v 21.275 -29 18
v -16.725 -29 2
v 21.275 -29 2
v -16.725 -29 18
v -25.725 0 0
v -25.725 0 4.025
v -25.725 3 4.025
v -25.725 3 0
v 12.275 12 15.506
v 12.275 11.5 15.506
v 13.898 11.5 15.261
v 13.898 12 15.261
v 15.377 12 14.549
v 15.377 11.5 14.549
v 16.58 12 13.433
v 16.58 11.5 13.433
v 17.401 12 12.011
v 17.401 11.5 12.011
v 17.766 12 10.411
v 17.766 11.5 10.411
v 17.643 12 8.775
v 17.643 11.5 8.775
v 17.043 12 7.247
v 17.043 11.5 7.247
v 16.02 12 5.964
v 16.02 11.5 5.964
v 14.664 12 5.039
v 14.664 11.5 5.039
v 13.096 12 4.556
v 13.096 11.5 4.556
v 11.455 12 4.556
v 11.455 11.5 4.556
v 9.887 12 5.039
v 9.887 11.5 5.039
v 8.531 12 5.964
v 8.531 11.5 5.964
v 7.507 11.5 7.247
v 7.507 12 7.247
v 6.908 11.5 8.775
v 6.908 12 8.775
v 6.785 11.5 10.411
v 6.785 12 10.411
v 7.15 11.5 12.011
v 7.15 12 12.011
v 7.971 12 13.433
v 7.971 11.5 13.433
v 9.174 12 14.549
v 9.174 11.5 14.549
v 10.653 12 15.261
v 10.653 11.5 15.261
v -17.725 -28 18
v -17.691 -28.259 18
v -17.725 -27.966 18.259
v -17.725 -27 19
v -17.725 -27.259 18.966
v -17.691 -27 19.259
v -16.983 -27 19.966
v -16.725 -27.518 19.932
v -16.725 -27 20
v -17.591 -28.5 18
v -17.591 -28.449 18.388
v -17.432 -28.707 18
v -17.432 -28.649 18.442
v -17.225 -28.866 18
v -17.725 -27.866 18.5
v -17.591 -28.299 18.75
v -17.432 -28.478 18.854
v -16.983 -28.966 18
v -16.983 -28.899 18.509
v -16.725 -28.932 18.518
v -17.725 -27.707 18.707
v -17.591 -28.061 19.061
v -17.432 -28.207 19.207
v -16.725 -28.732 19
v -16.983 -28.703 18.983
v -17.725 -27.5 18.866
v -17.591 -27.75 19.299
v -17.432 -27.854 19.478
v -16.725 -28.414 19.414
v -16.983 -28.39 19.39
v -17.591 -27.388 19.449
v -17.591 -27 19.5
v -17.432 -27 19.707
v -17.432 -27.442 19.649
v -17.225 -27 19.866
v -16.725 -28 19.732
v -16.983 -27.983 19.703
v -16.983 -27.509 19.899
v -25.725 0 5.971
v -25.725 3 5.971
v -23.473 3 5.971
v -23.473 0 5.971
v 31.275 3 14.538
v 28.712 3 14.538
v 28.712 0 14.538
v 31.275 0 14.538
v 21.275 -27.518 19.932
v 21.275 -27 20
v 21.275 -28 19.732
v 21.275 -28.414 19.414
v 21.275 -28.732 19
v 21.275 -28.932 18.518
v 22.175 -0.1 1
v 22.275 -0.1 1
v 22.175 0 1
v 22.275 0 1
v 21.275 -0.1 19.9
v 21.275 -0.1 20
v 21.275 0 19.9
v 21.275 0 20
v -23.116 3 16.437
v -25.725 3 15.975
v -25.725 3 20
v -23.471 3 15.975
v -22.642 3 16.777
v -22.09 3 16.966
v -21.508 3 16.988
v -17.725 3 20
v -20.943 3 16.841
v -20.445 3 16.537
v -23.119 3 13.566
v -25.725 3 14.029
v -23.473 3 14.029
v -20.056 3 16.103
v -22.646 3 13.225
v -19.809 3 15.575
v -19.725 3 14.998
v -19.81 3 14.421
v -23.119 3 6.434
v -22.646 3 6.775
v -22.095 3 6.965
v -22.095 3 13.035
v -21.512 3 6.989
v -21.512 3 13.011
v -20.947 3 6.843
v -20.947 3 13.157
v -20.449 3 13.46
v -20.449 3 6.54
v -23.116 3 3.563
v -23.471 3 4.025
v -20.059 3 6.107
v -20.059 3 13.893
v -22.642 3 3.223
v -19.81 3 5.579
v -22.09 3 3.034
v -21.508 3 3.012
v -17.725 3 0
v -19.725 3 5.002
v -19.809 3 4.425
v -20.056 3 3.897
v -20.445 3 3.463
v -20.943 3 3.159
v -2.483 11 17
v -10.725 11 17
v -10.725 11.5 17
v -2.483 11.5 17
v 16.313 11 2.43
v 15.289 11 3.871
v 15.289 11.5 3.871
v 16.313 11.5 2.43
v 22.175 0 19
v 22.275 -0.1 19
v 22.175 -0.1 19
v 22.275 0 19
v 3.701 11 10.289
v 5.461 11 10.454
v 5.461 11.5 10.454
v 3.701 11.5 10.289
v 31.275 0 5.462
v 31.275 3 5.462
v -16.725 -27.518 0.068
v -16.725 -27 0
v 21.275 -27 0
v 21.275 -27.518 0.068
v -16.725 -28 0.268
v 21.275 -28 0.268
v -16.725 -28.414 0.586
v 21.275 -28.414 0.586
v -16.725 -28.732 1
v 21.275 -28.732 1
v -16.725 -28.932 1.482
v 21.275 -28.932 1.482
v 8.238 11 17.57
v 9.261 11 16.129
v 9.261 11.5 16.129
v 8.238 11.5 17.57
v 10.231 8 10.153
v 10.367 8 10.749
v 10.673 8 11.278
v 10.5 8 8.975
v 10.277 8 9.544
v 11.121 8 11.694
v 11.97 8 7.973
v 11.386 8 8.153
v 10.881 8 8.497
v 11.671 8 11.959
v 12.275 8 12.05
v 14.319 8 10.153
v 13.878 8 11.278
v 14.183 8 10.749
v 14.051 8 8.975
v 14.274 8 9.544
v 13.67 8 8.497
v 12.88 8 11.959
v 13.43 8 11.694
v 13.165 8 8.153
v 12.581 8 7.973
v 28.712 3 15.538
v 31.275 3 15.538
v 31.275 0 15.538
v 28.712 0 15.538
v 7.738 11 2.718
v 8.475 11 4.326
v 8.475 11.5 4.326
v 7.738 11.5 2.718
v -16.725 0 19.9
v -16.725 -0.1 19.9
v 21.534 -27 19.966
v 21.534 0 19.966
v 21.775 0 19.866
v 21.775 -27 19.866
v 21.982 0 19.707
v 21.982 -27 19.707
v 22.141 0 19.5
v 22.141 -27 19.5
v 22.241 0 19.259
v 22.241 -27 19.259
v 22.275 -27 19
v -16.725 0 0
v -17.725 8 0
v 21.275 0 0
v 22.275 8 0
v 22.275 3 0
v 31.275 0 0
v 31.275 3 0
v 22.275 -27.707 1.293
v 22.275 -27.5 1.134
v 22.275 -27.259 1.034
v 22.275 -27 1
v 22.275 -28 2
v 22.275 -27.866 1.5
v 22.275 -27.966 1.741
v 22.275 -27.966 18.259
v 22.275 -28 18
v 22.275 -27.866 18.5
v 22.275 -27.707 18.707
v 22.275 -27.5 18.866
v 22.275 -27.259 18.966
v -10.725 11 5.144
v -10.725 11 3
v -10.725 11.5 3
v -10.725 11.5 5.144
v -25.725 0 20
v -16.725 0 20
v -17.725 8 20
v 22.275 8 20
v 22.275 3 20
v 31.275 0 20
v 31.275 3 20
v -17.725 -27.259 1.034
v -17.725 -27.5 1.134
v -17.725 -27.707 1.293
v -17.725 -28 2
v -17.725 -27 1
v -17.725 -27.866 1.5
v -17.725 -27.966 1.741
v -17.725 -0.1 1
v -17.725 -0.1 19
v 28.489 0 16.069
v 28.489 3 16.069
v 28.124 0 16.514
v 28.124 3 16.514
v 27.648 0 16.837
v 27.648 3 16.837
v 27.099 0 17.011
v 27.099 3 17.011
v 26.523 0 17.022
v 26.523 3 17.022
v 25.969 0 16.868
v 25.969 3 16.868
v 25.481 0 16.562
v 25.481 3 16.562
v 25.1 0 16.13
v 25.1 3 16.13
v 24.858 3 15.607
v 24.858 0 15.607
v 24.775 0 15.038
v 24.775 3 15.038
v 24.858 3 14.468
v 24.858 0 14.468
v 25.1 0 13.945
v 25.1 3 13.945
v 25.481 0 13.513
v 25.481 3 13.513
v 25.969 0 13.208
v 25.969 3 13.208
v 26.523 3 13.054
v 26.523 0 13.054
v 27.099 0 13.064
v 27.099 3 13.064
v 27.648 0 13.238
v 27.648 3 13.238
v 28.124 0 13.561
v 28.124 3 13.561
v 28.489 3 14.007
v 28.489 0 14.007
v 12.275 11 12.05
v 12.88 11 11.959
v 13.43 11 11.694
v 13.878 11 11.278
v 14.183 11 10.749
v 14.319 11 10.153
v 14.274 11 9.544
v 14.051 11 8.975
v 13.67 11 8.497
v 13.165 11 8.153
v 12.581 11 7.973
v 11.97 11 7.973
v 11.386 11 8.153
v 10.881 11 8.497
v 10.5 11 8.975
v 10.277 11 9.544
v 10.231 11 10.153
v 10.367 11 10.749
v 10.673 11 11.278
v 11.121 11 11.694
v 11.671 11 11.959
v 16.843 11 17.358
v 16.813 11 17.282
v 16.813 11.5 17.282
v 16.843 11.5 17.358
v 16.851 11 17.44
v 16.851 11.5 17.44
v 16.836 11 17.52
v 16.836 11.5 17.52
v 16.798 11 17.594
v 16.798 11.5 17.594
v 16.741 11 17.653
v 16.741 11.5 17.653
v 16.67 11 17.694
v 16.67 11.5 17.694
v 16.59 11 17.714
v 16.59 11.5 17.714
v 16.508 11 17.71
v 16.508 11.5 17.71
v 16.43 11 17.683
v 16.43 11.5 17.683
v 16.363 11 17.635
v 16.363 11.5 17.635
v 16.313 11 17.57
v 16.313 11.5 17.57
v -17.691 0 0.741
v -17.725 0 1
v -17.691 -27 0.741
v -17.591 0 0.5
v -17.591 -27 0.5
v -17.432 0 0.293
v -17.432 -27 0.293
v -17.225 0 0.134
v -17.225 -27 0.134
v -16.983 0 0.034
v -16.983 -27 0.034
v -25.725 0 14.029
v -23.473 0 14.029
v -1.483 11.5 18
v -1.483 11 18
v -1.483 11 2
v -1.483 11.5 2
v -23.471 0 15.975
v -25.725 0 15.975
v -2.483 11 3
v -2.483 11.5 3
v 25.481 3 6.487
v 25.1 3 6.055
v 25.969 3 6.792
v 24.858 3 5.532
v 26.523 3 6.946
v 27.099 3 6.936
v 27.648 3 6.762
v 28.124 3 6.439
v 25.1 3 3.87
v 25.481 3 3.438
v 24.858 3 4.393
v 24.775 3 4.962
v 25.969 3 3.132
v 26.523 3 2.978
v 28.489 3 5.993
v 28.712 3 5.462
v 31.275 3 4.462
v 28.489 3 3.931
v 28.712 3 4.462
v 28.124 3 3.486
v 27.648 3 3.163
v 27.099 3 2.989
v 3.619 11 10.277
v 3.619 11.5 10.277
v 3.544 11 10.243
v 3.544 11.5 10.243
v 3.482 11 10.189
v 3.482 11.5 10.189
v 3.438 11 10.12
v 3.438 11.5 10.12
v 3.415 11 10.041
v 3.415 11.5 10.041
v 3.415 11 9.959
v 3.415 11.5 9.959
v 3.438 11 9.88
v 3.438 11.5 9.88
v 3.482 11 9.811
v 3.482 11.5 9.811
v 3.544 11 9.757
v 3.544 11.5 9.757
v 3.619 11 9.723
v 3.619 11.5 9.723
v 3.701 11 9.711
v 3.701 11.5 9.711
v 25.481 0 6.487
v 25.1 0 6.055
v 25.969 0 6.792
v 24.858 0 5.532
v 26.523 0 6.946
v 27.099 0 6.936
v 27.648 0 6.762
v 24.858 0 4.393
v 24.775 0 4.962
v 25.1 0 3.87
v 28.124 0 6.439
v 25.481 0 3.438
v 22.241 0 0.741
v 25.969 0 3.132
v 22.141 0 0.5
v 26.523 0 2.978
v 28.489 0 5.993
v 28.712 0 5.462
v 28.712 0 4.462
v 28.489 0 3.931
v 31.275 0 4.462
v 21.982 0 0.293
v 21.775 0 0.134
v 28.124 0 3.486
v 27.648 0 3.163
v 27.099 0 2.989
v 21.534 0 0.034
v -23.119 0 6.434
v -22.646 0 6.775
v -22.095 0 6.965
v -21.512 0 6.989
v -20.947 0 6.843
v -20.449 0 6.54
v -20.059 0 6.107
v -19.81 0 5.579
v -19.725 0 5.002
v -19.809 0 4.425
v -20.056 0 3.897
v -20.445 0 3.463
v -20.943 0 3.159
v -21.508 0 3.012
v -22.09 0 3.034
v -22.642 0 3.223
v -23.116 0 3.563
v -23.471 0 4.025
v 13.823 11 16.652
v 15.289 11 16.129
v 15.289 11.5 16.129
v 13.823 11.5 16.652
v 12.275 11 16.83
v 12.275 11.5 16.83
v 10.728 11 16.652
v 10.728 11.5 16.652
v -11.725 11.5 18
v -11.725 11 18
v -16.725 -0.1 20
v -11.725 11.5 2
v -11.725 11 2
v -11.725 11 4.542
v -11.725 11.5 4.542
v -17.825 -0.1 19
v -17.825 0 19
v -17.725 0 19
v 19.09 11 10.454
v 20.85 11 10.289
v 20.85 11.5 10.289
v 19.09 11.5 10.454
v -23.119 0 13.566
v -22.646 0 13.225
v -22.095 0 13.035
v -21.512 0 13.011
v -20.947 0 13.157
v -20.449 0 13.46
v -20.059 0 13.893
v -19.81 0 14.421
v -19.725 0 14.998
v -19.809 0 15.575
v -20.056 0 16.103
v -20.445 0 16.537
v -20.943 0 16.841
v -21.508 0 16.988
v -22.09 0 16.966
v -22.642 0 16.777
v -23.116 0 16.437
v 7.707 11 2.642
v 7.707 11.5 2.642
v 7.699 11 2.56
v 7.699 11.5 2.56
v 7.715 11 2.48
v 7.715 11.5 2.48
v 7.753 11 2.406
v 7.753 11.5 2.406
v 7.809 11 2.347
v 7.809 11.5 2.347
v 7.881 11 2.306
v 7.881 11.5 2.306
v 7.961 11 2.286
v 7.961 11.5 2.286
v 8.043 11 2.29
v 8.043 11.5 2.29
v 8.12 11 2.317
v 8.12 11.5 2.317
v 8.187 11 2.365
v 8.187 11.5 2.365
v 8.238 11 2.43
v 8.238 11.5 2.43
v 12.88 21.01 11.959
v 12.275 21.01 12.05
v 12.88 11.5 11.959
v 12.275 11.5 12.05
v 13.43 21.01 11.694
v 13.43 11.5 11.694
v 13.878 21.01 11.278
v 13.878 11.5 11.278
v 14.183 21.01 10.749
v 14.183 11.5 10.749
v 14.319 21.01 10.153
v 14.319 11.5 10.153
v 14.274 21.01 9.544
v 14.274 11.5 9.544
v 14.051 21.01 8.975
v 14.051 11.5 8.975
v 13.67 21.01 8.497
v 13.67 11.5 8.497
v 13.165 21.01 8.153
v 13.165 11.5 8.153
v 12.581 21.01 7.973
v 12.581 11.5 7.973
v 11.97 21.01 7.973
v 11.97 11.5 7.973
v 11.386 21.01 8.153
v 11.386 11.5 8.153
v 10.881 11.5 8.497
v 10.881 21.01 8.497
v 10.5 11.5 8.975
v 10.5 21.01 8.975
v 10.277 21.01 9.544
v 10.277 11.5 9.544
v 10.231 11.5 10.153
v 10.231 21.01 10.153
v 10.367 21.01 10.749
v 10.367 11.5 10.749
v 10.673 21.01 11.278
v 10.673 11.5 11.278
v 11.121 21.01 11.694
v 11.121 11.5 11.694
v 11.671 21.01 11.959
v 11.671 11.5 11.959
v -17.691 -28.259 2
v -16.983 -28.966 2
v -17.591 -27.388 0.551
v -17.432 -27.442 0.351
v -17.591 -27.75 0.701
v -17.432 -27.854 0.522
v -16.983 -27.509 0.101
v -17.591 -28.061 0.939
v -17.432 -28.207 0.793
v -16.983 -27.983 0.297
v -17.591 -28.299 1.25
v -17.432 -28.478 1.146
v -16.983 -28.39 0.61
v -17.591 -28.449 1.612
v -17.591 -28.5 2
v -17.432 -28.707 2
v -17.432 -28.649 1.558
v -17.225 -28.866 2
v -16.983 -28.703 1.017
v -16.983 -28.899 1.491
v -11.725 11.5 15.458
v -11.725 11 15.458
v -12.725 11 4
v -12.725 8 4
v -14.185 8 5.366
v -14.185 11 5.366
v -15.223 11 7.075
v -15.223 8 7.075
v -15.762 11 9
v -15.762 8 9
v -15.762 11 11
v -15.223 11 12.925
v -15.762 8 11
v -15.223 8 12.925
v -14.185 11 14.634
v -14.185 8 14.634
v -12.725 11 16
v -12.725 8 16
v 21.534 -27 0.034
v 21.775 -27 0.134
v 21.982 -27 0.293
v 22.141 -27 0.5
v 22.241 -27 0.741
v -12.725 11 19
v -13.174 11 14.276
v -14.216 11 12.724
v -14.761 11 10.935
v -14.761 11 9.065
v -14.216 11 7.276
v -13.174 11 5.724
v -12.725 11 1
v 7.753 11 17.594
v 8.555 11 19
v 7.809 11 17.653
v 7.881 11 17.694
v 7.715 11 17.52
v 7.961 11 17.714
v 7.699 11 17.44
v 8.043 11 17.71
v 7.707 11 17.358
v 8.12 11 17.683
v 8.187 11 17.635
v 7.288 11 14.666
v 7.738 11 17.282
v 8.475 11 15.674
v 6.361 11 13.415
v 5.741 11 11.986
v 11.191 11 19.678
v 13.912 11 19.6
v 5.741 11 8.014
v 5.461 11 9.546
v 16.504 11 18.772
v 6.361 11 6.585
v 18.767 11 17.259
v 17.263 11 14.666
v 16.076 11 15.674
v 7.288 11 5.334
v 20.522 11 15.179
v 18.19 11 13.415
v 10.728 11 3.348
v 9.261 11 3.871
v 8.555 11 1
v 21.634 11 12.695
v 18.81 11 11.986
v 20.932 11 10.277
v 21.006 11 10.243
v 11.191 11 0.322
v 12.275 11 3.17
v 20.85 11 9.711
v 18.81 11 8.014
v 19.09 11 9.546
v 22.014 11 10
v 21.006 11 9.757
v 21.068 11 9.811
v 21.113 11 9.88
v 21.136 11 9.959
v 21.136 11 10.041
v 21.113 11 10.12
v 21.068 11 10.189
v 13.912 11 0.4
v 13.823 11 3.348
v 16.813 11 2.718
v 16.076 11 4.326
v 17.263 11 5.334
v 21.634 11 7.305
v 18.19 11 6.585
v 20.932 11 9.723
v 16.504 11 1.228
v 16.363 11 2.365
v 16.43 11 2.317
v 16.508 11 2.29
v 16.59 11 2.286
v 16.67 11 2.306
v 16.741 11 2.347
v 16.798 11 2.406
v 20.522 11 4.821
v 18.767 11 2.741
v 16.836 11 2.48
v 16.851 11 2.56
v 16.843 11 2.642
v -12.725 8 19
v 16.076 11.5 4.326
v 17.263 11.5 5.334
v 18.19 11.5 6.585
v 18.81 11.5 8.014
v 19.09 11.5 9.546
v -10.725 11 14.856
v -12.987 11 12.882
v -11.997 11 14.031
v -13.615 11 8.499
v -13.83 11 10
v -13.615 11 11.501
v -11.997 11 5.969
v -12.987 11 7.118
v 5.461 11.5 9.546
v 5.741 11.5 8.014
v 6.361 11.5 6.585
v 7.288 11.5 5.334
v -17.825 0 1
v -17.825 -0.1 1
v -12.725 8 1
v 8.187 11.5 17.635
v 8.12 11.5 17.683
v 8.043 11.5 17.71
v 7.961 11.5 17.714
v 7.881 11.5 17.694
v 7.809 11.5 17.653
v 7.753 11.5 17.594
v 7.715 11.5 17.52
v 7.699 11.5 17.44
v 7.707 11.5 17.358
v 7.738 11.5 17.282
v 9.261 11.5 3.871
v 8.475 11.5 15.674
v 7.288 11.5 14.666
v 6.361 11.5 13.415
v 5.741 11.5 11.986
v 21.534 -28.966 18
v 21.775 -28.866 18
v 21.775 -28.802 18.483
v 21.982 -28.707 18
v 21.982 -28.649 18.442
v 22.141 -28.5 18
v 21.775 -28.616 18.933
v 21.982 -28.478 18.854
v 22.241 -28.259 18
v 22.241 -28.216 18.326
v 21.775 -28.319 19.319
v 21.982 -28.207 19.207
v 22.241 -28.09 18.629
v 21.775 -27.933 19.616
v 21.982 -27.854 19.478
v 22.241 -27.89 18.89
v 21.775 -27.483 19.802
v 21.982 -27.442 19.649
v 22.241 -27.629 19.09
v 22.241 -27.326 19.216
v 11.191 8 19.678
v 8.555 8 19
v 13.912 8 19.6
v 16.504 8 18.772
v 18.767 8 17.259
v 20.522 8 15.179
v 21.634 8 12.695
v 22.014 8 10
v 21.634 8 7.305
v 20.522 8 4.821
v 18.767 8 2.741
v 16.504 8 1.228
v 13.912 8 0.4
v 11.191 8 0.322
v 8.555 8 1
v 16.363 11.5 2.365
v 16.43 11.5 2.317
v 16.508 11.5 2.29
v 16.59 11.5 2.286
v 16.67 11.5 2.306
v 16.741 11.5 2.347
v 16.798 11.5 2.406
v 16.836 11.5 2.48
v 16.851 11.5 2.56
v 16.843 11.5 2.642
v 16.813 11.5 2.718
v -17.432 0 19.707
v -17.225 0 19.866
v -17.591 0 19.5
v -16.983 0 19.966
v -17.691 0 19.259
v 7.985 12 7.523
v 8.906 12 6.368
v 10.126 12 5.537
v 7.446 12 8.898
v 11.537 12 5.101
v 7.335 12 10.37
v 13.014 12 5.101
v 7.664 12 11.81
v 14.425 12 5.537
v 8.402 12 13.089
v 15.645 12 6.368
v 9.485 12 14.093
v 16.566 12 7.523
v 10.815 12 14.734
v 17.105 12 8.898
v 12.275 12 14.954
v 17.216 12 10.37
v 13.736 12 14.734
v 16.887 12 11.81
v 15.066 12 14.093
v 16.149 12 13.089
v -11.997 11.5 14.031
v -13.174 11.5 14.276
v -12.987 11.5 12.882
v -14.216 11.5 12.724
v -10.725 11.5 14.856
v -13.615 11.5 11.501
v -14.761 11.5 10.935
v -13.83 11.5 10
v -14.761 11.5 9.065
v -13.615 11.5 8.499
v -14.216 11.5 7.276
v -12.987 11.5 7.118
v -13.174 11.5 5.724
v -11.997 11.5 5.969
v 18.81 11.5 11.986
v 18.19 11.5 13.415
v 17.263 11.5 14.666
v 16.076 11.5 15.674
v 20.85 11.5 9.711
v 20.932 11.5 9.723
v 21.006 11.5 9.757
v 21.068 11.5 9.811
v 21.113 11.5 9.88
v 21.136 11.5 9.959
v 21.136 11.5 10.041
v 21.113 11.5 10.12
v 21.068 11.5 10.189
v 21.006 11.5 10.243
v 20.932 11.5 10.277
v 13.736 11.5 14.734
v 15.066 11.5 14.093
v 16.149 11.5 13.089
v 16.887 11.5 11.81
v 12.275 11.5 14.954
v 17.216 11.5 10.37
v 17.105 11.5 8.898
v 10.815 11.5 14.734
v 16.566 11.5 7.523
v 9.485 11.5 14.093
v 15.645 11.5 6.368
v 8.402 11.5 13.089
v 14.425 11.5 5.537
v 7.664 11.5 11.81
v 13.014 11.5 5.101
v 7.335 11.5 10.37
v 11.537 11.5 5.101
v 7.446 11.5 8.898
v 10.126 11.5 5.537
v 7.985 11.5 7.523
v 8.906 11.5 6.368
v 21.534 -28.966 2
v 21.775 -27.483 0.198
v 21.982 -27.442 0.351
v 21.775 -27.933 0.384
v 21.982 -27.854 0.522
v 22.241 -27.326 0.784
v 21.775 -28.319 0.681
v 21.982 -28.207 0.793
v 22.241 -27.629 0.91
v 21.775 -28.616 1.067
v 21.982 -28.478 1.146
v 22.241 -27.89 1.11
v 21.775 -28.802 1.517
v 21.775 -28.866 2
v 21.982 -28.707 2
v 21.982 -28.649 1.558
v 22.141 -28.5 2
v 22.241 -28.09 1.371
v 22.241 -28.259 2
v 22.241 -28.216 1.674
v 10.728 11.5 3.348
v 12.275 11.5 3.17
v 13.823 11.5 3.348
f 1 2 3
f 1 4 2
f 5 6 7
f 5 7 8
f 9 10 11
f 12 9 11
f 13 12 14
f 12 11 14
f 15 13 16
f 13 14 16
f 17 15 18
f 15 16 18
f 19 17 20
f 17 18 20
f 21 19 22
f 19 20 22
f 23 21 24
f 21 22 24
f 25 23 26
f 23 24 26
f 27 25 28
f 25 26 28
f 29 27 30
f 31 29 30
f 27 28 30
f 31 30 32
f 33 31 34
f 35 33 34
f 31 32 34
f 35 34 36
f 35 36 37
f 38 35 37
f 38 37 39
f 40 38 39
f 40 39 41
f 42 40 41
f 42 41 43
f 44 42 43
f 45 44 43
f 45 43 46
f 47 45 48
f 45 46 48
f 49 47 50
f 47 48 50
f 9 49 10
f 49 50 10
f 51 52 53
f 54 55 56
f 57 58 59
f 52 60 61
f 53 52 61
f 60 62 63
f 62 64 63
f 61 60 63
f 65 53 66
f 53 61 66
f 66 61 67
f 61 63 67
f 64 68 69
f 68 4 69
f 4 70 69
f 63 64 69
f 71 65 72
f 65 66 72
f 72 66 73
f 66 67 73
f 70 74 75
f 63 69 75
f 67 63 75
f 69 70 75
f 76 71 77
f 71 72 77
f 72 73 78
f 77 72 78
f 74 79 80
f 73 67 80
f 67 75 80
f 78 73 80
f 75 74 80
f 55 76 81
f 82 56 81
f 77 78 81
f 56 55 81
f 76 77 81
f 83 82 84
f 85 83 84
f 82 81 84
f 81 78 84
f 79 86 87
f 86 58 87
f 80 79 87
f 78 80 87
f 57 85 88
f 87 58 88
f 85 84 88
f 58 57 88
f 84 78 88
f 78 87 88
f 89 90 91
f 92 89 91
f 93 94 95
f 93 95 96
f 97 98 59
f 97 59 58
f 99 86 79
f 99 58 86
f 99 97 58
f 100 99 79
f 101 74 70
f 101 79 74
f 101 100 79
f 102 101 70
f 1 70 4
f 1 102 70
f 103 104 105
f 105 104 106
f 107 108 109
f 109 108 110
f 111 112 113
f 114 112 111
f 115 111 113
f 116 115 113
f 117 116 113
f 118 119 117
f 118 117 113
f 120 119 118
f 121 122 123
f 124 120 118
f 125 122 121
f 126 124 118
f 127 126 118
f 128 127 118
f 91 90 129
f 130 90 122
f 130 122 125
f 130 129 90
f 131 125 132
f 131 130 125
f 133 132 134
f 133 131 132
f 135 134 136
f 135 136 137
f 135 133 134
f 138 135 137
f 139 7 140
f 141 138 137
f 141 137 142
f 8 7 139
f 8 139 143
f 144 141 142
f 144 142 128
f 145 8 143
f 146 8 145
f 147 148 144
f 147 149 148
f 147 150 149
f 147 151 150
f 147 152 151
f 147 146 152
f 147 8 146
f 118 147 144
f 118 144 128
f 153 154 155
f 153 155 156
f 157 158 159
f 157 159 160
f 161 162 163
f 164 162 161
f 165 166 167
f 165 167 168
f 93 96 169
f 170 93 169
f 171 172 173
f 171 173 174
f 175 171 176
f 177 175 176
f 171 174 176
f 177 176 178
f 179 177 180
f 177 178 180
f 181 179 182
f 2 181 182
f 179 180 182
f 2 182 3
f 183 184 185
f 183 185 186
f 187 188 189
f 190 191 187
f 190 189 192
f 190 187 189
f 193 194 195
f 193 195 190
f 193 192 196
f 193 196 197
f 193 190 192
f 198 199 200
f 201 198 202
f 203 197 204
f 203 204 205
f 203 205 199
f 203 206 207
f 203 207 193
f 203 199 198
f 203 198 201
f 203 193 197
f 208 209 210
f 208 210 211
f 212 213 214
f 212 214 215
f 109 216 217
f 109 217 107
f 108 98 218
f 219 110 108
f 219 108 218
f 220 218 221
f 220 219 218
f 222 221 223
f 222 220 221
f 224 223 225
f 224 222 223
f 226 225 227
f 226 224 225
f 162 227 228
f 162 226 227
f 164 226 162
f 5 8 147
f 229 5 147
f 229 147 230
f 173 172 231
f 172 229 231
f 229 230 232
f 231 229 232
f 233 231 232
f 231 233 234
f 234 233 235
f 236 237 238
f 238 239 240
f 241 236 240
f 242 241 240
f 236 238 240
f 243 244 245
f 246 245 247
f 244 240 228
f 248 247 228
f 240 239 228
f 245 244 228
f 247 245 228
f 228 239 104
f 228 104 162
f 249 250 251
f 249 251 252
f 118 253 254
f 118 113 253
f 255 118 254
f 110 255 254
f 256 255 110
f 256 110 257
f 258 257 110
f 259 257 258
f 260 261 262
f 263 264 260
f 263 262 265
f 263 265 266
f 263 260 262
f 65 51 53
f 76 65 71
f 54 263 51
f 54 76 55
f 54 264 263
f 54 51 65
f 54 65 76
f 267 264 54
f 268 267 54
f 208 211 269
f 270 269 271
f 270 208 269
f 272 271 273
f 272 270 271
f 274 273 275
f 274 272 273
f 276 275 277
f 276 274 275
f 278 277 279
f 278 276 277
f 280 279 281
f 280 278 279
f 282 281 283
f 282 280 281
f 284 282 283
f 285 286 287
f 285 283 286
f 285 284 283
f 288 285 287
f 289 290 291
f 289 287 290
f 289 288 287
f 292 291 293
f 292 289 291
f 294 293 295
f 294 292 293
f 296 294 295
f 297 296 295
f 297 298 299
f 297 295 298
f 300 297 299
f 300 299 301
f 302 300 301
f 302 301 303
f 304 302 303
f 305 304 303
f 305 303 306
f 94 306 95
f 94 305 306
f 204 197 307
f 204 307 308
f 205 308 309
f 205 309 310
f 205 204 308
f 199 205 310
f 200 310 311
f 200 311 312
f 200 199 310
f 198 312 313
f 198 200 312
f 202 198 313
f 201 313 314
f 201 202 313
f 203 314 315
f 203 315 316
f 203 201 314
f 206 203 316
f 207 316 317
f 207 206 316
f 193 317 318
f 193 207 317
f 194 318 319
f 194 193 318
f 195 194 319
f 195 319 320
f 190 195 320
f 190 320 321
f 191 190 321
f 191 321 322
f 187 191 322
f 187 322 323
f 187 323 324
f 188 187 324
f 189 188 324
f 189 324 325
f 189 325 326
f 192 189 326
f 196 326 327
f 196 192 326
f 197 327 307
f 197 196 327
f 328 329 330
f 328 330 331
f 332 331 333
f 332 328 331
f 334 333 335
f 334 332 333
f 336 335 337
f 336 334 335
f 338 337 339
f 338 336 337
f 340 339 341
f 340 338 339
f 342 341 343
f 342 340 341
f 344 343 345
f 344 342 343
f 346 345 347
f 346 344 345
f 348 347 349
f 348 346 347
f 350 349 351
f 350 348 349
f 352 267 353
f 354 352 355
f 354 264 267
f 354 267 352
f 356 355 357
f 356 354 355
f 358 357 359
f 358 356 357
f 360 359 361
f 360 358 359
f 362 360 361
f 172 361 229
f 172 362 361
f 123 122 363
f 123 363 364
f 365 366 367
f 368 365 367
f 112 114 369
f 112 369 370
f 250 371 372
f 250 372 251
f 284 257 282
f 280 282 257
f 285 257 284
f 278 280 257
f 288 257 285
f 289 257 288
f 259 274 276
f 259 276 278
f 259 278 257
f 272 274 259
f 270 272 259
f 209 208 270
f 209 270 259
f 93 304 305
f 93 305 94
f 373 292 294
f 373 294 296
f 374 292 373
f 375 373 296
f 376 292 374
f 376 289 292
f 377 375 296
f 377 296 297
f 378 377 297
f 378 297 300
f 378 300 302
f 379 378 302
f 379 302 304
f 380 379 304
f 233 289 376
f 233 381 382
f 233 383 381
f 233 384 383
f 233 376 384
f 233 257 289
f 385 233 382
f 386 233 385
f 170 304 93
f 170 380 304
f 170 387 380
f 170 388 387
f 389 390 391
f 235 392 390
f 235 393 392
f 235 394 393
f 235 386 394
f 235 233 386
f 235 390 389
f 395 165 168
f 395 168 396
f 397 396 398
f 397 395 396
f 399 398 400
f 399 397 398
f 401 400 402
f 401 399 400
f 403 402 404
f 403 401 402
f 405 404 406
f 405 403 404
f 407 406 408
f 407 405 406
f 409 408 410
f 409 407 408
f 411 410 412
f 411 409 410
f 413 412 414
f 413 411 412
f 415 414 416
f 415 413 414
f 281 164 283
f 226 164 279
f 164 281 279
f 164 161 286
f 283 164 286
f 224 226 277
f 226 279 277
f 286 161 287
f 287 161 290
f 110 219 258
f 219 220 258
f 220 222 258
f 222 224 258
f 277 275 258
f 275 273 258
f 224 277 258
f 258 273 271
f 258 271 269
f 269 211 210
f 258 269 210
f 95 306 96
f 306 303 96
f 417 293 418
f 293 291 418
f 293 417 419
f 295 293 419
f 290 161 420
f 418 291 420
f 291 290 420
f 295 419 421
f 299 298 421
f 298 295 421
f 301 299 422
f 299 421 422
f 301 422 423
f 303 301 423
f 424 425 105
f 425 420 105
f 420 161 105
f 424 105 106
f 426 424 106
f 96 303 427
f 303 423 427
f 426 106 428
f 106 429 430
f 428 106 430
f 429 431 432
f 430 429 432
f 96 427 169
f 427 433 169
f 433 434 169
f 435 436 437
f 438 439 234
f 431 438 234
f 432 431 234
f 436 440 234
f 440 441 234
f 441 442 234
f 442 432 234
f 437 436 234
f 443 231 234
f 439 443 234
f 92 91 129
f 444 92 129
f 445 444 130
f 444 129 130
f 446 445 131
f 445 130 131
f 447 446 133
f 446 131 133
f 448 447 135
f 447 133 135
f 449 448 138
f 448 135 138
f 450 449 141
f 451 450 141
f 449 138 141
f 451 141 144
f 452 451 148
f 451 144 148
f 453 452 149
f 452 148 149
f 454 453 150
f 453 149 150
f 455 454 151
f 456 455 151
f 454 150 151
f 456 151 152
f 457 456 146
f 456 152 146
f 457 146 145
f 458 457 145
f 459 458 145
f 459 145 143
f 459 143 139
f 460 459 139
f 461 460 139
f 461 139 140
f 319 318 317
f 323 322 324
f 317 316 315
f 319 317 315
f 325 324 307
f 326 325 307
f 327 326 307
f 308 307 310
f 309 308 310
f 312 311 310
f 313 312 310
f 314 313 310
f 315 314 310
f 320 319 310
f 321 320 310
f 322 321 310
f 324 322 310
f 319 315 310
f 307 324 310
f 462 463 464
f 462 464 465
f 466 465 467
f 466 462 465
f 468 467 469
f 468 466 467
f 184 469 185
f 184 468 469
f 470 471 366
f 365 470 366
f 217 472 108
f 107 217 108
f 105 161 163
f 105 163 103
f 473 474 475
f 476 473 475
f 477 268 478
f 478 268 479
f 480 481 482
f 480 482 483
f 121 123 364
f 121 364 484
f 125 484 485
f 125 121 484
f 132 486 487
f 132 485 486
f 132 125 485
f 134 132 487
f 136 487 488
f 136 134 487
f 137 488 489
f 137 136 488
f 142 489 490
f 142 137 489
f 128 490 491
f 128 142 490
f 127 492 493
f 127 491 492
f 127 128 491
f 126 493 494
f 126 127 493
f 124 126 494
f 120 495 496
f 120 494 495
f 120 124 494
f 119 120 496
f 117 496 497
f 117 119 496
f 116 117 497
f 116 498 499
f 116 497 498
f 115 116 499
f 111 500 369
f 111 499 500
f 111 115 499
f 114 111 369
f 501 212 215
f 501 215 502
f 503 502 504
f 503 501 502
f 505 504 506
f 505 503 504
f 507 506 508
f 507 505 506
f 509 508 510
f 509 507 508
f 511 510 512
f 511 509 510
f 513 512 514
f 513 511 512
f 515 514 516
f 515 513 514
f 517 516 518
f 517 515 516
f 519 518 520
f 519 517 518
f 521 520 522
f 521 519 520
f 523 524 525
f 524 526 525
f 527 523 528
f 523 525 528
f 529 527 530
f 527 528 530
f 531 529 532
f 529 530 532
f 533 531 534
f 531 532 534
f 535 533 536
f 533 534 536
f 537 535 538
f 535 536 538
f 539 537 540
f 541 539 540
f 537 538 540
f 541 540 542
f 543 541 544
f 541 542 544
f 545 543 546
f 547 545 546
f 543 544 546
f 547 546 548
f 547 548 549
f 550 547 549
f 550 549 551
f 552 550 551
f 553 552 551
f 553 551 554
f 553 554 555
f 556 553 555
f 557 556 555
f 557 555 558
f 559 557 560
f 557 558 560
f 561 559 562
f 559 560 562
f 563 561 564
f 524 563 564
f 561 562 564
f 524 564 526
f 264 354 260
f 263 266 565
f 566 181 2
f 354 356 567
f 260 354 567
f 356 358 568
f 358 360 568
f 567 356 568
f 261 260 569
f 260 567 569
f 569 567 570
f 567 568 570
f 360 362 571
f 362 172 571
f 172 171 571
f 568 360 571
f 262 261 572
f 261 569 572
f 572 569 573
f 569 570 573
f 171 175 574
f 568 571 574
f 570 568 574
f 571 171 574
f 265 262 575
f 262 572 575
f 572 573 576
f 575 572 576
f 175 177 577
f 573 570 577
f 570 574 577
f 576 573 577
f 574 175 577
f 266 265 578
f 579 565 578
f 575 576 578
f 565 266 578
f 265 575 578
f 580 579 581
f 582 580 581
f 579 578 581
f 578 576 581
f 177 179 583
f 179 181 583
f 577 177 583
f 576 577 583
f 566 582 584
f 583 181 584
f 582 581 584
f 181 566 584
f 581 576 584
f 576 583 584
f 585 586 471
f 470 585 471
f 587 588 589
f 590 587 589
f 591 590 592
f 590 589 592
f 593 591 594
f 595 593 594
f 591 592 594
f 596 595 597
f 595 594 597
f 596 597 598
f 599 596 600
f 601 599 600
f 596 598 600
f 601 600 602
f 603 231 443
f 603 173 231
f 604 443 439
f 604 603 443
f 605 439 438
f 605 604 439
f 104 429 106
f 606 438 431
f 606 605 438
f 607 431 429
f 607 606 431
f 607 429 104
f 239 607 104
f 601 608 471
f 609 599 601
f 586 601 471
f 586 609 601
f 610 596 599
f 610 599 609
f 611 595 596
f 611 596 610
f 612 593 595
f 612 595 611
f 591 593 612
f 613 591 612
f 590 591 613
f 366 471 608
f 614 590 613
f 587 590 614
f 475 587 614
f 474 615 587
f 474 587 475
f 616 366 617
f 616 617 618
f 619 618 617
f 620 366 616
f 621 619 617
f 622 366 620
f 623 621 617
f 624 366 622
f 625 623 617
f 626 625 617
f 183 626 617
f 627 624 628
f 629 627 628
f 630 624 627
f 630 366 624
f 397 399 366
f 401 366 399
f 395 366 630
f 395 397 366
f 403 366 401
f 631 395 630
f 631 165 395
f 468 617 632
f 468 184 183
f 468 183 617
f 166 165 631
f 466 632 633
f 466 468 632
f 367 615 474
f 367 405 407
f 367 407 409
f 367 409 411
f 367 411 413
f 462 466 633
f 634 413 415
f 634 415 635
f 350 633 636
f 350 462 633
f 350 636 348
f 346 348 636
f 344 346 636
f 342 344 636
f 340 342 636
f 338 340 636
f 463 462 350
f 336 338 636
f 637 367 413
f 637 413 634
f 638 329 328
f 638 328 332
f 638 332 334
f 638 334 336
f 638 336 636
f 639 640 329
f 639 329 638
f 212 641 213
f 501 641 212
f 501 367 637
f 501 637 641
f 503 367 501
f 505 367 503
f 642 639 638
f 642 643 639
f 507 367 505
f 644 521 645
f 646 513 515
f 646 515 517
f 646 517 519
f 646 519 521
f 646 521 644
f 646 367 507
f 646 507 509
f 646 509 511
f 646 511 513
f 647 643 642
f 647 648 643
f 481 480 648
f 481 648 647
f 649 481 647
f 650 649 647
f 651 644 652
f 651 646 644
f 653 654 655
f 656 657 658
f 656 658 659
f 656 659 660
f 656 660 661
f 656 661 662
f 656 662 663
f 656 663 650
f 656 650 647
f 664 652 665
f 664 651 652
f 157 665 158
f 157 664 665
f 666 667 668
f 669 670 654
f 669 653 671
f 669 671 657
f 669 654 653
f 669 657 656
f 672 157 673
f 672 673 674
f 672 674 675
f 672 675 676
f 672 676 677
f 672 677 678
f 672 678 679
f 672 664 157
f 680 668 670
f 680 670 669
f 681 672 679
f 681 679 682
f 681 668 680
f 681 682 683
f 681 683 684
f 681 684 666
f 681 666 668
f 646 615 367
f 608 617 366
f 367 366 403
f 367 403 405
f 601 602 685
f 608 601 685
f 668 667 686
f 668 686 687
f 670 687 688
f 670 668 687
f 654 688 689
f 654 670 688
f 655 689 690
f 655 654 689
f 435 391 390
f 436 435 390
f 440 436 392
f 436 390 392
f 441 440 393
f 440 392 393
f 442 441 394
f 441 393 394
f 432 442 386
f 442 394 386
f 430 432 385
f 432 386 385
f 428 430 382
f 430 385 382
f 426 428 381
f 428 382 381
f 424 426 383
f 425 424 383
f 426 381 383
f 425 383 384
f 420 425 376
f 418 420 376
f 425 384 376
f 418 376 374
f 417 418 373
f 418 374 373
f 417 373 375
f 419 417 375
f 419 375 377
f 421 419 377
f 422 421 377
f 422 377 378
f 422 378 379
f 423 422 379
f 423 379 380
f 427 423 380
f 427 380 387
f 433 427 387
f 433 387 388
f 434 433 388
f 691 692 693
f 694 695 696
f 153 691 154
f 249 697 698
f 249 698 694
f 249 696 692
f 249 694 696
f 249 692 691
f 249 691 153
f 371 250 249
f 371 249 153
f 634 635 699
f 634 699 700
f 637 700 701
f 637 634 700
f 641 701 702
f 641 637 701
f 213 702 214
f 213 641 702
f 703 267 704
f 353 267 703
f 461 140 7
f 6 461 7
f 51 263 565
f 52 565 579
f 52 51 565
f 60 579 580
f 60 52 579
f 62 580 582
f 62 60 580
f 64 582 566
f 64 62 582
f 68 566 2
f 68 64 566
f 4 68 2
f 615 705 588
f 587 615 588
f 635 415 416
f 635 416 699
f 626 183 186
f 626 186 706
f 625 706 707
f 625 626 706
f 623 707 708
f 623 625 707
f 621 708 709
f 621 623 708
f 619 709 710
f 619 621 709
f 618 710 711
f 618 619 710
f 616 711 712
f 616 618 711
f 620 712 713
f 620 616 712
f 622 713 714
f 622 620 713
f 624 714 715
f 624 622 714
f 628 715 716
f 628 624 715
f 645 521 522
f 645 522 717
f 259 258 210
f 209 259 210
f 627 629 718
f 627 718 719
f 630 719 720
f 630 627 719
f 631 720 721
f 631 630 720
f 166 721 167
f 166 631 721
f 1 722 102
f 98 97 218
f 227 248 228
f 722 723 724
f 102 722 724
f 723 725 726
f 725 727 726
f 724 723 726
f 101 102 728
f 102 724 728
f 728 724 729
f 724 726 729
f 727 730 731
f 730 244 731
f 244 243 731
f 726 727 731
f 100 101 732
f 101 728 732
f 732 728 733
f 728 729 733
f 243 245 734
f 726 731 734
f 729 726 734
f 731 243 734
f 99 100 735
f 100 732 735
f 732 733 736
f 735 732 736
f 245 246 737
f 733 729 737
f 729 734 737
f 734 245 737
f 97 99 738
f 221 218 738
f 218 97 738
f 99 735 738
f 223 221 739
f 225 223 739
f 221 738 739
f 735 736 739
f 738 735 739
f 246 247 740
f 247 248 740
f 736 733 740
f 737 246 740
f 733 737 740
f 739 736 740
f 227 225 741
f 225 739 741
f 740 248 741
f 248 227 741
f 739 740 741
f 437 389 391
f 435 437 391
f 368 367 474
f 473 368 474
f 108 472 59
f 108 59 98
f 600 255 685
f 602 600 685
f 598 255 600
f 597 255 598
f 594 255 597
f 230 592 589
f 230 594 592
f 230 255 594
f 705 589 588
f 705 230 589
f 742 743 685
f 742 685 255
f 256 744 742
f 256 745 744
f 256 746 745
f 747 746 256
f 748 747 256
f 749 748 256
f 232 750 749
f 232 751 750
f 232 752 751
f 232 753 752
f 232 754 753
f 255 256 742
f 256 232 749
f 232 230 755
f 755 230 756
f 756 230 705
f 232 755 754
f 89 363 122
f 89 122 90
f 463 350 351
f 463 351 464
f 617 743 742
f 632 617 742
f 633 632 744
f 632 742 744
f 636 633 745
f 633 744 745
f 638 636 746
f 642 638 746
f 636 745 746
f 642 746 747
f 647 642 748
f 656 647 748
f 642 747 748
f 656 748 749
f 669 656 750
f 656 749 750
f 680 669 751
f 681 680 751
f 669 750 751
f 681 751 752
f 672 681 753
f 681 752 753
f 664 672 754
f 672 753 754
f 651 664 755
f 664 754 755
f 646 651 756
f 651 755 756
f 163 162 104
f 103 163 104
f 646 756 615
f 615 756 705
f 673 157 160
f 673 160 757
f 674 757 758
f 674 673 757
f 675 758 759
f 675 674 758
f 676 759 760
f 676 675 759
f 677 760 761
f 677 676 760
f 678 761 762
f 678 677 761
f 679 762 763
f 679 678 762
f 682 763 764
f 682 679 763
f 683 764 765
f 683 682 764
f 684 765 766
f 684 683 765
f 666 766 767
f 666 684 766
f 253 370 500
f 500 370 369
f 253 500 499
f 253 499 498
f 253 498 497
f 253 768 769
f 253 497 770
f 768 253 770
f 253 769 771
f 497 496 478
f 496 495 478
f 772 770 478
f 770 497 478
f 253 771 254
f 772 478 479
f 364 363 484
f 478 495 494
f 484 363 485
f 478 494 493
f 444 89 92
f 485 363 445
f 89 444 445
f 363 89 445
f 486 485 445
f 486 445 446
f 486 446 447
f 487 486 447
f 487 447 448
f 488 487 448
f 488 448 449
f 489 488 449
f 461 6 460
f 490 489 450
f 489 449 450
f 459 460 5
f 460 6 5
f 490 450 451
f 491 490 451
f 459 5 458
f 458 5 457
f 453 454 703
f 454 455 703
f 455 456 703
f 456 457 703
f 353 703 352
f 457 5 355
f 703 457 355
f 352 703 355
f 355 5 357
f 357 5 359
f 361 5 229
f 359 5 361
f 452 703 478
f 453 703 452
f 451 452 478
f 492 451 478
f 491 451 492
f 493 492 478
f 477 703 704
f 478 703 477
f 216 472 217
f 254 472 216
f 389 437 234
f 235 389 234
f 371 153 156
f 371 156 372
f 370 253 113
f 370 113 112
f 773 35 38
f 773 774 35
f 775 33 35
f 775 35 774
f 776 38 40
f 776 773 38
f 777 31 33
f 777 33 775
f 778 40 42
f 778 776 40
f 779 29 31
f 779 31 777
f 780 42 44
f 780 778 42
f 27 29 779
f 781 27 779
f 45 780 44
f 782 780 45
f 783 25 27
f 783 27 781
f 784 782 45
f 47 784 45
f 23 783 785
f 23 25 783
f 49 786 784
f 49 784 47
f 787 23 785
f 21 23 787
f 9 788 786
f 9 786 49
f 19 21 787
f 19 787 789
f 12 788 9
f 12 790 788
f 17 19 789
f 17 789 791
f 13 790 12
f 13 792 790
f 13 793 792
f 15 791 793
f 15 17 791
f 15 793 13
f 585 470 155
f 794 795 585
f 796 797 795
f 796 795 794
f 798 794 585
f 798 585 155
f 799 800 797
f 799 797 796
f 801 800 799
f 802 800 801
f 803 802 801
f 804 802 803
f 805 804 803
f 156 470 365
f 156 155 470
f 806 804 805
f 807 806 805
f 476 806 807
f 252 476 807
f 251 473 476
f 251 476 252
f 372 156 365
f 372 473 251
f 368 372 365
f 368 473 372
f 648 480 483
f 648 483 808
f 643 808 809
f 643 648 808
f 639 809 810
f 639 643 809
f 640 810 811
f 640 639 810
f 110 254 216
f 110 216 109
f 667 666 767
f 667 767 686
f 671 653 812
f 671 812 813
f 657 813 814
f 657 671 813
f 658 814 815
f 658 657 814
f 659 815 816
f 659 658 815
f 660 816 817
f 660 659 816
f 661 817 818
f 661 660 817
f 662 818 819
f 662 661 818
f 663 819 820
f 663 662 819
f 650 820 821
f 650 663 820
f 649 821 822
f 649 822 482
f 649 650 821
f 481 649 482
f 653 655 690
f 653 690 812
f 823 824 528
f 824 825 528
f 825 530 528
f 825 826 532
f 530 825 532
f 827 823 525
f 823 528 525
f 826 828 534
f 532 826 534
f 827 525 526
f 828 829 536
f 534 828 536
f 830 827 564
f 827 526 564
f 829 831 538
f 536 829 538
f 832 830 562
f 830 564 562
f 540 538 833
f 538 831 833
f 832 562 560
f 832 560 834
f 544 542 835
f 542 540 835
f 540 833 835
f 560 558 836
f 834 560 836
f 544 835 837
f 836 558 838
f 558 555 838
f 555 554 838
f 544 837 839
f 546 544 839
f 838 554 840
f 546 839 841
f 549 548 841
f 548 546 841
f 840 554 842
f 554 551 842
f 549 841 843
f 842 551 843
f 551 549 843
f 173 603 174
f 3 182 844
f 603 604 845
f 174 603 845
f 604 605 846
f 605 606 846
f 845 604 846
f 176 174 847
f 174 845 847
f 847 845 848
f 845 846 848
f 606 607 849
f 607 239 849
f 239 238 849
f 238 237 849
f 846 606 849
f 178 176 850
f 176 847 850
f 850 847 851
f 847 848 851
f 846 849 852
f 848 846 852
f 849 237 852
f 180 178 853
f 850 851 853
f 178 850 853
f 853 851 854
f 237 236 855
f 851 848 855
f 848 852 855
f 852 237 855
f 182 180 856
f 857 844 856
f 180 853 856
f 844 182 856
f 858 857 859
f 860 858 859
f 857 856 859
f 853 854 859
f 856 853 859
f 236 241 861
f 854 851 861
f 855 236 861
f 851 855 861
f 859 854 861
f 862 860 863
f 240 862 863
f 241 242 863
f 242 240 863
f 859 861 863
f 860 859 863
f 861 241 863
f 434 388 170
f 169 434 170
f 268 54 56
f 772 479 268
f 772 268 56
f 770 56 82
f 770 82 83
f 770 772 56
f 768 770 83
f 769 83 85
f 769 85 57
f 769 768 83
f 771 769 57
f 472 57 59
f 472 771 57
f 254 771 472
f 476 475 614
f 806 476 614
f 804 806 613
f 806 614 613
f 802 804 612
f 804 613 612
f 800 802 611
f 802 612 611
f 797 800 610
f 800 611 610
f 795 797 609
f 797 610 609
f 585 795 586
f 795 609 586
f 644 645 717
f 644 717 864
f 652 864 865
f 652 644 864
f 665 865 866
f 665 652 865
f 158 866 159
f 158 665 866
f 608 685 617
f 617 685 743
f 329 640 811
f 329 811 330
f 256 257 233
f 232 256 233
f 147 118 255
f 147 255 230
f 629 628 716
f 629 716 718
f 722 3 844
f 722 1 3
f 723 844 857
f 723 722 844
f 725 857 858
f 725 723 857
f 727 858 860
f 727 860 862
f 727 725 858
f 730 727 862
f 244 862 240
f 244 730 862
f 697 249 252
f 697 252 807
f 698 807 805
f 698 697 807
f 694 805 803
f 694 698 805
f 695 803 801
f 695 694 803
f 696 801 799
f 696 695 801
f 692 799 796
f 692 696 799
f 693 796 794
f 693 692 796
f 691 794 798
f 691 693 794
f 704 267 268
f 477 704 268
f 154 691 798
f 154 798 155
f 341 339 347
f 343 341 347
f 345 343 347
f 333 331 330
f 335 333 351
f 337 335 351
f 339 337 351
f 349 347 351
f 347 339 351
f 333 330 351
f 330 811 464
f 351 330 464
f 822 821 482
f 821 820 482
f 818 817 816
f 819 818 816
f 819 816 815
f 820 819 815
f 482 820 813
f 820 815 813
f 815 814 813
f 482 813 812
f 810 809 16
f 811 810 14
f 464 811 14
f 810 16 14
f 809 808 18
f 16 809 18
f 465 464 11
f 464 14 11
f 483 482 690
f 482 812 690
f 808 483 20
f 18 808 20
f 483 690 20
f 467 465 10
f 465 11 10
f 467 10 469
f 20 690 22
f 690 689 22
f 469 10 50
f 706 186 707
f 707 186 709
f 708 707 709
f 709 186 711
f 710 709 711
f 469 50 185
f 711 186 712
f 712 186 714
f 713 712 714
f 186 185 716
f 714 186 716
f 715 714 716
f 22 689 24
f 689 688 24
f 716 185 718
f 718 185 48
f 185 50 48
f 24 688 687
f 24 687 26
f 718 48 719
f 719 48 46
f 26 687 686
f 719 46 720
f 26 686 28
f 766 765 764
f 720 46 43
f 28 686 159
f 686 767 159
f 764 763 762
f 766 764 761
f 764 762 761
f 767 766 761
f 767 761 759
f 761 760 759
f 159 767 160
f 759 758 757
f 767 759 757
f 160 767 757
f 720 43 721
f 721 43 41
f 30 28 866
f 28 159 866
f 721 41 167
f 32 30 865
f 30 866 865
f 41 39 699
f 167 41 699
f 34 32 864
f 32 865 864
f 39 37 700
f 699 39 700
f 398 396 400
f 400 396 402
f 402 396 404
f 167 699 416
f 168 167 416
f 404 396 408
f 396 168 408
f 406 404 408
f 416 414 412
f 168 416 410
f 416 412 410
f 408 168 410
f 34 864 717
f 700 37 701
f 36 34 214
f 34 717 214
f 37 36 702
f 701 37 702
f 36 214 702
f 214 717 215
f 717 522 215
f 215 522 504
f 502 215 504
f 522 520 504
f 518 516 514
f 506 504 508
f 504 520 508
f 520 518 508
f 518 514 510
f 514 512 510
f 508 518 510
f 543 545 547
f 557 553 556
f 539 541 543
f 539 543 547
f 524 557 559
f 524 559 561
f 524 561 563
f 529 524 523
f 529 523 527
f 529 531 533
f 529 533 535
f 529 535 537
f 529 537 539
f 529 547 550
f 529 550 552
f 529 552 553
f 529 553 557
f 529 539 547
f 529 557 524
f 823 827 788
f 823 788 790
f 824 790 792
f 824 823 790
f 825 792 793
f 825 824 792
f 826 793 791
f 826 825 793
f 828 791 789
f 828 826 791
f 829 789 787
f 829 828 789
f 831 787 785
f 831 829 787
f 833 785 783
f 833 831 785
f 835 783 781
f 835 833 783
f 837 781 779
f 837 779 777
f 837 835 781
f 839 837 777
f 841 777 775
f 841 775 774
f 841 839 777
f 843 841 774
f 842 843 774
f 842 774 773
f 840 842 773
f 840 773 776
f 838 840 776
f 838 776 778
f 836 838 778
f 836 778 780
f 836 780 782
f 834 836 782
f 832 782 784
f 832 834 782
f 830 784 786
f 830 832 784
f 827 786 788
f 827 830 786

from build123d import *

# Parameters (mm, degrees)
SKETCH1_W            = 57
SKETCH1_H            = 20
BOSS_EXTRUDE2_DEPTH  = 3
SKETCH3_W            = 40
SKETCH3_H            = 20
BOSS_EXTRUDE3_DEPTH  = 27
SKETCH4_W            = 40
SKETCH4_H            = 20
BOSS_EXTRUDE4_DEPTH  = 5
SKETCH7_R            = 2.049783944
BOSS_EXTRUDE5_DEPTH  = 3
SKETCH8_W            = 40
SKETCH8_H            = 20
BOSS_EXTRUDE6_DEPTH  = 2
FILLET1_R            = 2
FILLET3_R            = 1
CUT_EXTRUDE1_DEPTH   = 12
CUT_EXTRUDE2_DEPTH   = 12
SKETCH12_R           = 2.049783944
BOSS_EXTRUDE7_DEPTH  = 10
SKETCH13_W           = 38
SKETCH13_H           = 0.1
CUT_EXTRUDE3_DEPTH   = 0.1
SKETCH14_W           = 18
SKETCH14_H           = 0.1
CUT_EXTRUDE4_DEPTH   = 0.1
SKETCH16_W           = 18
SKETCH16_H           = 0.1
BOSS_EXTRUDE10_DEPTH = 0.1
BOSS_EXTRUDE13_DEPTH = 0.5
SKETCH18_R           = 5.505741297
SKETCH18_R_2         = 4.954025226
BOSS_EXTRUDE14_DEPTH = 0.5
BOSS_EXTRUDE15_DEPTH = 0.5
SKETCH22_R           = 2.049783944
BOSS_EXTRUDE17_DEPTH = 0.01


with BuildPart() as part:
    # Sketch1 → Boss-Extrude2 (new body)
    with BuildSketch(Plane(origin=(0, 0, 0), x_dir=(1, 0, 0), z_dir=(0, 1, 0))):
        with Locations((2.775361092, -10)):
            Rectangle(SKETCH1_W, SKETCH1_H)
    extrude(amount=BOSS_EXTRUDE2_DEPTH)

    # Sketch3 → Boss-Extrude3 (add)
    with BuildSketch(Plane.XZ):
        with Locations((2.275361092, 10)):
            Rectangle(SKETCH3_W, SKETCH3_H)
    extrude(amount=BOSS_EXTRUDE3_DEPTH)

    # Sketch4 → Boss-Extrude4 (add)
    with BuildSketch(Plane(origin=(0, 3, 0), x_dir=(1, 0, 0), z_dir=(0, 1, 0))):
        with Locations((2.275361092, -10)):
            Rectangle(SKETCH4_W, SKETCH4_H)
    extrude(amount=BOSS_EXTRUDE4_DEPTH)

    # Sketch7 → Boss-Extrude5 (add)
    with BuildSketch(Plane(origin=(0, 8, 0), x_dir=(1, 0, 0), z_dir=(0, 1, 0))):
        with BuildLine():
            Line((8.555331619, -1), (-12.724638908, -1))
            Line((-12.724638908, -1), (-12.724638908, -4))
            ThreePointArc((-12.724638908, -4), (-15.83010298, -10), (-12.724638908, -16))
            Line((-12.724638908, -16), (-12.724638908, -19))
            Line((-12.724638908, -19), (8.555331619, -19))
            ThreePointArc((8.555331619, -19), (22.013873261, -10), (8.555331619, -1))
        make_face()
        with Locations(Location((12.275361092, -10, 0), (0, 0, 270))):
            Circle(SKETCH7_R, mode=Mode.SUBTRACT)
    extrude(amount=BOSS_EXTRUDE5_DEPTH)

    # Sketch8 → Boss-Extrude6 (add)
    with BuildSketch(Plane.XZ.offset(27)):
        with Locations((2.275361092, 10)):
            Rectangle(SKETCH8_W, SKETCH8_H)
    extrude(amount=BOSS_EXTRUDE6_DEPTH)

    # Fillet1
    fillet1_edges = [part.edges().sort_by_distance(p)[0] for p in [
        (2.275361092, -29, 20),
        (2.275361092, -29, 0),
    ]]
    fillet(fillet1_edges, radius=FILLET1_R)

    # Fillet3
    fillet3_edges = [part.edges().sort_by_distance(p)[0] for p in [
        (22.275361092, -29, 10),
        (-17.724638908, -29, 10),
        (-17.724638908, -13.5, 0),
        (-17.724638908, -13.5, 20),
        (-17.724638908, -28.414213562, 0.585786438),
        (-17.724638908, -28.414213562, 19.414213562),
        (22.275361092, -13.5, 20),
        (22.275361092, -13.5, 0),
        (22.275361092, -28.414213562, 0.585786438),
        (22.275361092, -28.414213562, 19.414213562),
    ]]
    fillet(fillet3_edges, radius=FILLET3_R)

    # Sketch9 → Cut-Extrude1 (cut)
    with BuildSketch(Plane(origin=(0, 3, 0), x_dir=(1, 0, 0), z_dir=(0, 1, 0))):
        with BuildLine():
            Line((-25.724638908, -15.974539408), (-25.724638908, -14.029117413))
            Line((-25.724638908, -14.029117413), (-23.473177442, -14.029117413))
            ThreePointArc((-23.473177442, -14.029117413), (-19.724640003, -14.997907425), (-23.47114197, -15.974539408))
            Line((-23.47114197, -15.974539408), (-25.724638908, -15.974539408))
        make_face()
        with BuildLine():
            Line((-23.47114197, -4.025460592), (-25.724638908, -4.025460592))
            Line((-25.724638908, -4.025460592), (-25.724638908, -5.970882587))
            Line((-25.724638908, -5.970882587), (-23.473177442, -5.970882587))
            ThreePointArc((-23.473177442, -5.970882587), (-19.724640003, -5.002092575), (-23.47114197, -4.025460592))
        make_face()
    extrude(amount=-CUT_EXTRUDE1_DEPTH, mode=Mode.SUBTRACT)

    # Sketch11 → Cut-Extrude2 (cut)
    with BuildSketch(Plane(origin=(0, 3, 0), x_dir=(1, 0, 0), z_dir=(0, 1, 0))):
        with BuildLine():
            Line((31.275361092, -5.46228452), (31.275361092, -4.46228452))
            Line((31.275361092, -4.46228452), (28.711852765, -4.46228452))
            ThreePointArc((28.711852765, -4.46228452), (24.775361092, -4.96228452), (28.711852765, -5.46228452))
            Line((28.711852765, -5.46228452), (31.275361092, -5.46228452))
        make_face()
        with BuildLine():
            Line((28.711852765, -14.53771548), (31.275361092, -14.53771548))
            Line((31.275361092, -14.53771548), (31.275361092, -15.53771548))
            Line((31.275361092, -15.53771548), (28.711852765, -15.53771548))
            ThreePointArc((28.711852765, -15.53771548), (24.775361092, -15.03771548), (28.711852765, -14.53771548))
        make_face()
    extrude(amount=-CUT_EXTRUDE2_DEPTH, mode=Mode.SUBTRACT)

    # Sketch13 → Cut-Extrude3 (cut)
    with BuildSketch(Plane.XY.offset(20)):
        with Locations((2.275361092, -0.05)):
            Rectangle(SKETCH13_W, SKETCH13_H)
    extrude(amount=-CUT_EXTRUDE3_DEPTH, mode=Mode.SUBTRACT)

    # Sketch14 → Cut-Extrude4 (cut)
    with BuildSketch(Plane(origin=(22.275361092, 0, 0), x_dir=(0, 0, -1), z_dir=(1, 0, 0))):
        with Locations((-10, -0.05)):
            Rectangle(SKETCH14_W, SKETCH14_H)
    extrude(amount=-CUT_EXTRUDE4_DEPTH, mode=Mode.SUBTRACT)

    # Sketch16 → Boss-Extrude10 (add)
    with BuildSketch(Plane.ZY.offset(17.724638908)):
        with Locations((10, -0.05)):
            Rectangle(SKETCH16_W, SKETCH16_H)
    extrude(amount=BOSS_EXTRUDE10_DEPTH)



with BuildPart() as body_2:
    # Sketch12 → Boss-Extrude7 (new body)
    with BuildSketch(Plane(origin=(0, 11, 0), x_dir=(1, 0, 0), z_dir=(0, 1, 0))):
        with Locations(Location((12.275361092, -10, 0), (0, 0, 270))):
            Circle(SKETCH12_R)
    extrude(amount=BOSS_EXTRUDE7_DEPTH)


with BuildPart() as part_1:
    add(part.part)

    add(body_2.part)  # Boss-Extrude13 merges body 2
    # Sketch17 → Boss-Extrude13 (add)
    with BuildSketch(Plane(origin=(0, 11, 0), x_dir=(1, 0, 0), z_dir=(0, 1, 0))):
        with BuildLine():
            Line((20.850118946, -10.288863052), (19.089941192, -10.454244634))
            ThreePointArc((19.089941192, -10.454244634), (18.190057204, -13.414851392), (16.076038534, -15.674477166))
            Line((16.076038534, -15.674477166), (16.81290276, -17.281526608))
            ThreePointArc((16.81290276, -17.281526608), (16.707171545, -17.676120875), (16.312577278, -17.57038966))
            Line((16.312577278, -17.57038966), (15.289263749, -16.1287218))
            ThreePointArc((15.289263749, -16.1287218), (12.275361092, -16.829702785), (9.261458434, -16.1287218))
            Line((9.261458434, -16.1287218), (8.238144905, -17.57038966))
            ThreePointArc((8.238144905, -17.57038966), (7.843550638, -17.676120875), (7.737819423, -17.281526608))
            Line((7.737819423, -17.281526608), (8.474683649, -15.674477166))
            ThreePointArc((8.474683649, -15.674477166), (6.360664979, -13.414851392), (5.460780991, -10.454244634))
            Line((5.460780991, -10.454244634), (3.700603237, -10.288863052))
            ThreePointArc((3.700603237, -10.288863052), (3.411740185, -10), (3.700603237, -9.711136948))
            Line((3.700603237, -9.711136948), (5.460780991, -9.545755366))
            ThreePointArc((5.460780991, -9.545755366), (6.360664979, -6.585148608), (8.474683649, -4.325522834))
            Line((8.474683649, -4.325522834), (7.737819423, -2.718473392))
            ThreePointArc((7.737819423, -2.718473392), (7.843550638, -2.323879125), (8.238144905, -2.42961034))
            Line((8.238144905, -2.42961034), (9.261458434, -3.8712782))
            ThreePointArc((9.261458434, -3.8712782), (12.275361092, -3.170297215), (15.289263749, -3.8712782))
            Line((15.289263749, -3.8712782), (16.312577278, -2.42961034))
            ThreePointArc((16.312577278, -2.42961034), (16.707171545, -2.323879125), (16.81290276, -2.718473392))
            Line((16.81290276, -2.718473392), (16.076038534, -4.325522834))
            ThreePointArc((16.076038534, -4.325522834), (18.190057204, -6.585148608), (19.089941192, -9.545755366))
            Line((19.089941192, -9.545755366), (20.850118946, -9.711136948))
            ThreePointArc((20.850118946, -9.711136948), (21.138981999, -10), (20.850118946, -10.288863052))
        make_face()
    extrude(amount=BOSS_EXTRUDE13_DEPTH)

    # Sketch18 → Boss-Extrude14 (add)
    with BuildSketch(Plane(origin=(0, 11.5, 0), x_dir=(1, 0, 0), z_dir=(0, 1, 0))):
        with Locations(Location((12.275361092, -10, 0), (0, 0, 270))):
            Circle(SKETCH18_R)
        with Locations(Location((12.275361092, -10, 0), (0, 0, 270))):
            Circle(SKETCH18_R_2, mode=Mode.SUBTRACT)
    extrude(amount=BOSS_EXTRUDE14_DEPTH)

    # Sketch20 → Boss-Extrude15 (add)
    with BuildSketch(Plane(origin=(0, 11, 0), x_dir=(1, 0, 0), z_dir=(0, 1, 0))):
        with BuildLine():
            Line((-1.482591904, -18), (-1.482591904, -2))
            Line((-1.482591904, -2), (-11.724638908, -2))
            Line((-11.724638908, -2), (-11.724638908, -4.542063407))
            ThreePointArc((-11.724638908, -4.542063407), (-14.83010298, -10), (-11.724638908, -15.457936593))
            Line((-11.724638908, -15.457936593), (-11.724638908, -18))
            Line((-11.724638908, -18), (-1.482591904, -18))
        make_face()
        with BuildLine():
            Line((-2.482591904, -3), (-10.724638908, -3))
            Line((-10.724638908, -3), (-10.724638908, -5.144266923))
            ThreePointArc((-10.724638908, -5.144266923), (-13.83010298, -10), (-10.724638908, -14.855733077))
            Line((-10.724638908, -14.855733077), (-10.724638908, -17))
            Line((-10.724638908, -17), (-2.482591904, -17))
            Line((-2.482591904, -17), (-2.482591904, -3))
        make_face(mode=Mode.SUBTRACT)
    extrude(amount=BOSS_EXTRUDE15_DEPTH)

    # Sketch22 → Boss-Extrude17 (add)
    with BuildSketch(Plane(origin=(0, 21, 0), x_dir=(1, 0, 0), z_dir=(0, 1, 0))):
        with Locations(Location((12.275361092, -10, 0), (0, 0, 270))):
            Circle(SKETCH22_R)
    extrude(amount=BOSS_EXTRUDE17_DEPTH)


solid = part_1.part
